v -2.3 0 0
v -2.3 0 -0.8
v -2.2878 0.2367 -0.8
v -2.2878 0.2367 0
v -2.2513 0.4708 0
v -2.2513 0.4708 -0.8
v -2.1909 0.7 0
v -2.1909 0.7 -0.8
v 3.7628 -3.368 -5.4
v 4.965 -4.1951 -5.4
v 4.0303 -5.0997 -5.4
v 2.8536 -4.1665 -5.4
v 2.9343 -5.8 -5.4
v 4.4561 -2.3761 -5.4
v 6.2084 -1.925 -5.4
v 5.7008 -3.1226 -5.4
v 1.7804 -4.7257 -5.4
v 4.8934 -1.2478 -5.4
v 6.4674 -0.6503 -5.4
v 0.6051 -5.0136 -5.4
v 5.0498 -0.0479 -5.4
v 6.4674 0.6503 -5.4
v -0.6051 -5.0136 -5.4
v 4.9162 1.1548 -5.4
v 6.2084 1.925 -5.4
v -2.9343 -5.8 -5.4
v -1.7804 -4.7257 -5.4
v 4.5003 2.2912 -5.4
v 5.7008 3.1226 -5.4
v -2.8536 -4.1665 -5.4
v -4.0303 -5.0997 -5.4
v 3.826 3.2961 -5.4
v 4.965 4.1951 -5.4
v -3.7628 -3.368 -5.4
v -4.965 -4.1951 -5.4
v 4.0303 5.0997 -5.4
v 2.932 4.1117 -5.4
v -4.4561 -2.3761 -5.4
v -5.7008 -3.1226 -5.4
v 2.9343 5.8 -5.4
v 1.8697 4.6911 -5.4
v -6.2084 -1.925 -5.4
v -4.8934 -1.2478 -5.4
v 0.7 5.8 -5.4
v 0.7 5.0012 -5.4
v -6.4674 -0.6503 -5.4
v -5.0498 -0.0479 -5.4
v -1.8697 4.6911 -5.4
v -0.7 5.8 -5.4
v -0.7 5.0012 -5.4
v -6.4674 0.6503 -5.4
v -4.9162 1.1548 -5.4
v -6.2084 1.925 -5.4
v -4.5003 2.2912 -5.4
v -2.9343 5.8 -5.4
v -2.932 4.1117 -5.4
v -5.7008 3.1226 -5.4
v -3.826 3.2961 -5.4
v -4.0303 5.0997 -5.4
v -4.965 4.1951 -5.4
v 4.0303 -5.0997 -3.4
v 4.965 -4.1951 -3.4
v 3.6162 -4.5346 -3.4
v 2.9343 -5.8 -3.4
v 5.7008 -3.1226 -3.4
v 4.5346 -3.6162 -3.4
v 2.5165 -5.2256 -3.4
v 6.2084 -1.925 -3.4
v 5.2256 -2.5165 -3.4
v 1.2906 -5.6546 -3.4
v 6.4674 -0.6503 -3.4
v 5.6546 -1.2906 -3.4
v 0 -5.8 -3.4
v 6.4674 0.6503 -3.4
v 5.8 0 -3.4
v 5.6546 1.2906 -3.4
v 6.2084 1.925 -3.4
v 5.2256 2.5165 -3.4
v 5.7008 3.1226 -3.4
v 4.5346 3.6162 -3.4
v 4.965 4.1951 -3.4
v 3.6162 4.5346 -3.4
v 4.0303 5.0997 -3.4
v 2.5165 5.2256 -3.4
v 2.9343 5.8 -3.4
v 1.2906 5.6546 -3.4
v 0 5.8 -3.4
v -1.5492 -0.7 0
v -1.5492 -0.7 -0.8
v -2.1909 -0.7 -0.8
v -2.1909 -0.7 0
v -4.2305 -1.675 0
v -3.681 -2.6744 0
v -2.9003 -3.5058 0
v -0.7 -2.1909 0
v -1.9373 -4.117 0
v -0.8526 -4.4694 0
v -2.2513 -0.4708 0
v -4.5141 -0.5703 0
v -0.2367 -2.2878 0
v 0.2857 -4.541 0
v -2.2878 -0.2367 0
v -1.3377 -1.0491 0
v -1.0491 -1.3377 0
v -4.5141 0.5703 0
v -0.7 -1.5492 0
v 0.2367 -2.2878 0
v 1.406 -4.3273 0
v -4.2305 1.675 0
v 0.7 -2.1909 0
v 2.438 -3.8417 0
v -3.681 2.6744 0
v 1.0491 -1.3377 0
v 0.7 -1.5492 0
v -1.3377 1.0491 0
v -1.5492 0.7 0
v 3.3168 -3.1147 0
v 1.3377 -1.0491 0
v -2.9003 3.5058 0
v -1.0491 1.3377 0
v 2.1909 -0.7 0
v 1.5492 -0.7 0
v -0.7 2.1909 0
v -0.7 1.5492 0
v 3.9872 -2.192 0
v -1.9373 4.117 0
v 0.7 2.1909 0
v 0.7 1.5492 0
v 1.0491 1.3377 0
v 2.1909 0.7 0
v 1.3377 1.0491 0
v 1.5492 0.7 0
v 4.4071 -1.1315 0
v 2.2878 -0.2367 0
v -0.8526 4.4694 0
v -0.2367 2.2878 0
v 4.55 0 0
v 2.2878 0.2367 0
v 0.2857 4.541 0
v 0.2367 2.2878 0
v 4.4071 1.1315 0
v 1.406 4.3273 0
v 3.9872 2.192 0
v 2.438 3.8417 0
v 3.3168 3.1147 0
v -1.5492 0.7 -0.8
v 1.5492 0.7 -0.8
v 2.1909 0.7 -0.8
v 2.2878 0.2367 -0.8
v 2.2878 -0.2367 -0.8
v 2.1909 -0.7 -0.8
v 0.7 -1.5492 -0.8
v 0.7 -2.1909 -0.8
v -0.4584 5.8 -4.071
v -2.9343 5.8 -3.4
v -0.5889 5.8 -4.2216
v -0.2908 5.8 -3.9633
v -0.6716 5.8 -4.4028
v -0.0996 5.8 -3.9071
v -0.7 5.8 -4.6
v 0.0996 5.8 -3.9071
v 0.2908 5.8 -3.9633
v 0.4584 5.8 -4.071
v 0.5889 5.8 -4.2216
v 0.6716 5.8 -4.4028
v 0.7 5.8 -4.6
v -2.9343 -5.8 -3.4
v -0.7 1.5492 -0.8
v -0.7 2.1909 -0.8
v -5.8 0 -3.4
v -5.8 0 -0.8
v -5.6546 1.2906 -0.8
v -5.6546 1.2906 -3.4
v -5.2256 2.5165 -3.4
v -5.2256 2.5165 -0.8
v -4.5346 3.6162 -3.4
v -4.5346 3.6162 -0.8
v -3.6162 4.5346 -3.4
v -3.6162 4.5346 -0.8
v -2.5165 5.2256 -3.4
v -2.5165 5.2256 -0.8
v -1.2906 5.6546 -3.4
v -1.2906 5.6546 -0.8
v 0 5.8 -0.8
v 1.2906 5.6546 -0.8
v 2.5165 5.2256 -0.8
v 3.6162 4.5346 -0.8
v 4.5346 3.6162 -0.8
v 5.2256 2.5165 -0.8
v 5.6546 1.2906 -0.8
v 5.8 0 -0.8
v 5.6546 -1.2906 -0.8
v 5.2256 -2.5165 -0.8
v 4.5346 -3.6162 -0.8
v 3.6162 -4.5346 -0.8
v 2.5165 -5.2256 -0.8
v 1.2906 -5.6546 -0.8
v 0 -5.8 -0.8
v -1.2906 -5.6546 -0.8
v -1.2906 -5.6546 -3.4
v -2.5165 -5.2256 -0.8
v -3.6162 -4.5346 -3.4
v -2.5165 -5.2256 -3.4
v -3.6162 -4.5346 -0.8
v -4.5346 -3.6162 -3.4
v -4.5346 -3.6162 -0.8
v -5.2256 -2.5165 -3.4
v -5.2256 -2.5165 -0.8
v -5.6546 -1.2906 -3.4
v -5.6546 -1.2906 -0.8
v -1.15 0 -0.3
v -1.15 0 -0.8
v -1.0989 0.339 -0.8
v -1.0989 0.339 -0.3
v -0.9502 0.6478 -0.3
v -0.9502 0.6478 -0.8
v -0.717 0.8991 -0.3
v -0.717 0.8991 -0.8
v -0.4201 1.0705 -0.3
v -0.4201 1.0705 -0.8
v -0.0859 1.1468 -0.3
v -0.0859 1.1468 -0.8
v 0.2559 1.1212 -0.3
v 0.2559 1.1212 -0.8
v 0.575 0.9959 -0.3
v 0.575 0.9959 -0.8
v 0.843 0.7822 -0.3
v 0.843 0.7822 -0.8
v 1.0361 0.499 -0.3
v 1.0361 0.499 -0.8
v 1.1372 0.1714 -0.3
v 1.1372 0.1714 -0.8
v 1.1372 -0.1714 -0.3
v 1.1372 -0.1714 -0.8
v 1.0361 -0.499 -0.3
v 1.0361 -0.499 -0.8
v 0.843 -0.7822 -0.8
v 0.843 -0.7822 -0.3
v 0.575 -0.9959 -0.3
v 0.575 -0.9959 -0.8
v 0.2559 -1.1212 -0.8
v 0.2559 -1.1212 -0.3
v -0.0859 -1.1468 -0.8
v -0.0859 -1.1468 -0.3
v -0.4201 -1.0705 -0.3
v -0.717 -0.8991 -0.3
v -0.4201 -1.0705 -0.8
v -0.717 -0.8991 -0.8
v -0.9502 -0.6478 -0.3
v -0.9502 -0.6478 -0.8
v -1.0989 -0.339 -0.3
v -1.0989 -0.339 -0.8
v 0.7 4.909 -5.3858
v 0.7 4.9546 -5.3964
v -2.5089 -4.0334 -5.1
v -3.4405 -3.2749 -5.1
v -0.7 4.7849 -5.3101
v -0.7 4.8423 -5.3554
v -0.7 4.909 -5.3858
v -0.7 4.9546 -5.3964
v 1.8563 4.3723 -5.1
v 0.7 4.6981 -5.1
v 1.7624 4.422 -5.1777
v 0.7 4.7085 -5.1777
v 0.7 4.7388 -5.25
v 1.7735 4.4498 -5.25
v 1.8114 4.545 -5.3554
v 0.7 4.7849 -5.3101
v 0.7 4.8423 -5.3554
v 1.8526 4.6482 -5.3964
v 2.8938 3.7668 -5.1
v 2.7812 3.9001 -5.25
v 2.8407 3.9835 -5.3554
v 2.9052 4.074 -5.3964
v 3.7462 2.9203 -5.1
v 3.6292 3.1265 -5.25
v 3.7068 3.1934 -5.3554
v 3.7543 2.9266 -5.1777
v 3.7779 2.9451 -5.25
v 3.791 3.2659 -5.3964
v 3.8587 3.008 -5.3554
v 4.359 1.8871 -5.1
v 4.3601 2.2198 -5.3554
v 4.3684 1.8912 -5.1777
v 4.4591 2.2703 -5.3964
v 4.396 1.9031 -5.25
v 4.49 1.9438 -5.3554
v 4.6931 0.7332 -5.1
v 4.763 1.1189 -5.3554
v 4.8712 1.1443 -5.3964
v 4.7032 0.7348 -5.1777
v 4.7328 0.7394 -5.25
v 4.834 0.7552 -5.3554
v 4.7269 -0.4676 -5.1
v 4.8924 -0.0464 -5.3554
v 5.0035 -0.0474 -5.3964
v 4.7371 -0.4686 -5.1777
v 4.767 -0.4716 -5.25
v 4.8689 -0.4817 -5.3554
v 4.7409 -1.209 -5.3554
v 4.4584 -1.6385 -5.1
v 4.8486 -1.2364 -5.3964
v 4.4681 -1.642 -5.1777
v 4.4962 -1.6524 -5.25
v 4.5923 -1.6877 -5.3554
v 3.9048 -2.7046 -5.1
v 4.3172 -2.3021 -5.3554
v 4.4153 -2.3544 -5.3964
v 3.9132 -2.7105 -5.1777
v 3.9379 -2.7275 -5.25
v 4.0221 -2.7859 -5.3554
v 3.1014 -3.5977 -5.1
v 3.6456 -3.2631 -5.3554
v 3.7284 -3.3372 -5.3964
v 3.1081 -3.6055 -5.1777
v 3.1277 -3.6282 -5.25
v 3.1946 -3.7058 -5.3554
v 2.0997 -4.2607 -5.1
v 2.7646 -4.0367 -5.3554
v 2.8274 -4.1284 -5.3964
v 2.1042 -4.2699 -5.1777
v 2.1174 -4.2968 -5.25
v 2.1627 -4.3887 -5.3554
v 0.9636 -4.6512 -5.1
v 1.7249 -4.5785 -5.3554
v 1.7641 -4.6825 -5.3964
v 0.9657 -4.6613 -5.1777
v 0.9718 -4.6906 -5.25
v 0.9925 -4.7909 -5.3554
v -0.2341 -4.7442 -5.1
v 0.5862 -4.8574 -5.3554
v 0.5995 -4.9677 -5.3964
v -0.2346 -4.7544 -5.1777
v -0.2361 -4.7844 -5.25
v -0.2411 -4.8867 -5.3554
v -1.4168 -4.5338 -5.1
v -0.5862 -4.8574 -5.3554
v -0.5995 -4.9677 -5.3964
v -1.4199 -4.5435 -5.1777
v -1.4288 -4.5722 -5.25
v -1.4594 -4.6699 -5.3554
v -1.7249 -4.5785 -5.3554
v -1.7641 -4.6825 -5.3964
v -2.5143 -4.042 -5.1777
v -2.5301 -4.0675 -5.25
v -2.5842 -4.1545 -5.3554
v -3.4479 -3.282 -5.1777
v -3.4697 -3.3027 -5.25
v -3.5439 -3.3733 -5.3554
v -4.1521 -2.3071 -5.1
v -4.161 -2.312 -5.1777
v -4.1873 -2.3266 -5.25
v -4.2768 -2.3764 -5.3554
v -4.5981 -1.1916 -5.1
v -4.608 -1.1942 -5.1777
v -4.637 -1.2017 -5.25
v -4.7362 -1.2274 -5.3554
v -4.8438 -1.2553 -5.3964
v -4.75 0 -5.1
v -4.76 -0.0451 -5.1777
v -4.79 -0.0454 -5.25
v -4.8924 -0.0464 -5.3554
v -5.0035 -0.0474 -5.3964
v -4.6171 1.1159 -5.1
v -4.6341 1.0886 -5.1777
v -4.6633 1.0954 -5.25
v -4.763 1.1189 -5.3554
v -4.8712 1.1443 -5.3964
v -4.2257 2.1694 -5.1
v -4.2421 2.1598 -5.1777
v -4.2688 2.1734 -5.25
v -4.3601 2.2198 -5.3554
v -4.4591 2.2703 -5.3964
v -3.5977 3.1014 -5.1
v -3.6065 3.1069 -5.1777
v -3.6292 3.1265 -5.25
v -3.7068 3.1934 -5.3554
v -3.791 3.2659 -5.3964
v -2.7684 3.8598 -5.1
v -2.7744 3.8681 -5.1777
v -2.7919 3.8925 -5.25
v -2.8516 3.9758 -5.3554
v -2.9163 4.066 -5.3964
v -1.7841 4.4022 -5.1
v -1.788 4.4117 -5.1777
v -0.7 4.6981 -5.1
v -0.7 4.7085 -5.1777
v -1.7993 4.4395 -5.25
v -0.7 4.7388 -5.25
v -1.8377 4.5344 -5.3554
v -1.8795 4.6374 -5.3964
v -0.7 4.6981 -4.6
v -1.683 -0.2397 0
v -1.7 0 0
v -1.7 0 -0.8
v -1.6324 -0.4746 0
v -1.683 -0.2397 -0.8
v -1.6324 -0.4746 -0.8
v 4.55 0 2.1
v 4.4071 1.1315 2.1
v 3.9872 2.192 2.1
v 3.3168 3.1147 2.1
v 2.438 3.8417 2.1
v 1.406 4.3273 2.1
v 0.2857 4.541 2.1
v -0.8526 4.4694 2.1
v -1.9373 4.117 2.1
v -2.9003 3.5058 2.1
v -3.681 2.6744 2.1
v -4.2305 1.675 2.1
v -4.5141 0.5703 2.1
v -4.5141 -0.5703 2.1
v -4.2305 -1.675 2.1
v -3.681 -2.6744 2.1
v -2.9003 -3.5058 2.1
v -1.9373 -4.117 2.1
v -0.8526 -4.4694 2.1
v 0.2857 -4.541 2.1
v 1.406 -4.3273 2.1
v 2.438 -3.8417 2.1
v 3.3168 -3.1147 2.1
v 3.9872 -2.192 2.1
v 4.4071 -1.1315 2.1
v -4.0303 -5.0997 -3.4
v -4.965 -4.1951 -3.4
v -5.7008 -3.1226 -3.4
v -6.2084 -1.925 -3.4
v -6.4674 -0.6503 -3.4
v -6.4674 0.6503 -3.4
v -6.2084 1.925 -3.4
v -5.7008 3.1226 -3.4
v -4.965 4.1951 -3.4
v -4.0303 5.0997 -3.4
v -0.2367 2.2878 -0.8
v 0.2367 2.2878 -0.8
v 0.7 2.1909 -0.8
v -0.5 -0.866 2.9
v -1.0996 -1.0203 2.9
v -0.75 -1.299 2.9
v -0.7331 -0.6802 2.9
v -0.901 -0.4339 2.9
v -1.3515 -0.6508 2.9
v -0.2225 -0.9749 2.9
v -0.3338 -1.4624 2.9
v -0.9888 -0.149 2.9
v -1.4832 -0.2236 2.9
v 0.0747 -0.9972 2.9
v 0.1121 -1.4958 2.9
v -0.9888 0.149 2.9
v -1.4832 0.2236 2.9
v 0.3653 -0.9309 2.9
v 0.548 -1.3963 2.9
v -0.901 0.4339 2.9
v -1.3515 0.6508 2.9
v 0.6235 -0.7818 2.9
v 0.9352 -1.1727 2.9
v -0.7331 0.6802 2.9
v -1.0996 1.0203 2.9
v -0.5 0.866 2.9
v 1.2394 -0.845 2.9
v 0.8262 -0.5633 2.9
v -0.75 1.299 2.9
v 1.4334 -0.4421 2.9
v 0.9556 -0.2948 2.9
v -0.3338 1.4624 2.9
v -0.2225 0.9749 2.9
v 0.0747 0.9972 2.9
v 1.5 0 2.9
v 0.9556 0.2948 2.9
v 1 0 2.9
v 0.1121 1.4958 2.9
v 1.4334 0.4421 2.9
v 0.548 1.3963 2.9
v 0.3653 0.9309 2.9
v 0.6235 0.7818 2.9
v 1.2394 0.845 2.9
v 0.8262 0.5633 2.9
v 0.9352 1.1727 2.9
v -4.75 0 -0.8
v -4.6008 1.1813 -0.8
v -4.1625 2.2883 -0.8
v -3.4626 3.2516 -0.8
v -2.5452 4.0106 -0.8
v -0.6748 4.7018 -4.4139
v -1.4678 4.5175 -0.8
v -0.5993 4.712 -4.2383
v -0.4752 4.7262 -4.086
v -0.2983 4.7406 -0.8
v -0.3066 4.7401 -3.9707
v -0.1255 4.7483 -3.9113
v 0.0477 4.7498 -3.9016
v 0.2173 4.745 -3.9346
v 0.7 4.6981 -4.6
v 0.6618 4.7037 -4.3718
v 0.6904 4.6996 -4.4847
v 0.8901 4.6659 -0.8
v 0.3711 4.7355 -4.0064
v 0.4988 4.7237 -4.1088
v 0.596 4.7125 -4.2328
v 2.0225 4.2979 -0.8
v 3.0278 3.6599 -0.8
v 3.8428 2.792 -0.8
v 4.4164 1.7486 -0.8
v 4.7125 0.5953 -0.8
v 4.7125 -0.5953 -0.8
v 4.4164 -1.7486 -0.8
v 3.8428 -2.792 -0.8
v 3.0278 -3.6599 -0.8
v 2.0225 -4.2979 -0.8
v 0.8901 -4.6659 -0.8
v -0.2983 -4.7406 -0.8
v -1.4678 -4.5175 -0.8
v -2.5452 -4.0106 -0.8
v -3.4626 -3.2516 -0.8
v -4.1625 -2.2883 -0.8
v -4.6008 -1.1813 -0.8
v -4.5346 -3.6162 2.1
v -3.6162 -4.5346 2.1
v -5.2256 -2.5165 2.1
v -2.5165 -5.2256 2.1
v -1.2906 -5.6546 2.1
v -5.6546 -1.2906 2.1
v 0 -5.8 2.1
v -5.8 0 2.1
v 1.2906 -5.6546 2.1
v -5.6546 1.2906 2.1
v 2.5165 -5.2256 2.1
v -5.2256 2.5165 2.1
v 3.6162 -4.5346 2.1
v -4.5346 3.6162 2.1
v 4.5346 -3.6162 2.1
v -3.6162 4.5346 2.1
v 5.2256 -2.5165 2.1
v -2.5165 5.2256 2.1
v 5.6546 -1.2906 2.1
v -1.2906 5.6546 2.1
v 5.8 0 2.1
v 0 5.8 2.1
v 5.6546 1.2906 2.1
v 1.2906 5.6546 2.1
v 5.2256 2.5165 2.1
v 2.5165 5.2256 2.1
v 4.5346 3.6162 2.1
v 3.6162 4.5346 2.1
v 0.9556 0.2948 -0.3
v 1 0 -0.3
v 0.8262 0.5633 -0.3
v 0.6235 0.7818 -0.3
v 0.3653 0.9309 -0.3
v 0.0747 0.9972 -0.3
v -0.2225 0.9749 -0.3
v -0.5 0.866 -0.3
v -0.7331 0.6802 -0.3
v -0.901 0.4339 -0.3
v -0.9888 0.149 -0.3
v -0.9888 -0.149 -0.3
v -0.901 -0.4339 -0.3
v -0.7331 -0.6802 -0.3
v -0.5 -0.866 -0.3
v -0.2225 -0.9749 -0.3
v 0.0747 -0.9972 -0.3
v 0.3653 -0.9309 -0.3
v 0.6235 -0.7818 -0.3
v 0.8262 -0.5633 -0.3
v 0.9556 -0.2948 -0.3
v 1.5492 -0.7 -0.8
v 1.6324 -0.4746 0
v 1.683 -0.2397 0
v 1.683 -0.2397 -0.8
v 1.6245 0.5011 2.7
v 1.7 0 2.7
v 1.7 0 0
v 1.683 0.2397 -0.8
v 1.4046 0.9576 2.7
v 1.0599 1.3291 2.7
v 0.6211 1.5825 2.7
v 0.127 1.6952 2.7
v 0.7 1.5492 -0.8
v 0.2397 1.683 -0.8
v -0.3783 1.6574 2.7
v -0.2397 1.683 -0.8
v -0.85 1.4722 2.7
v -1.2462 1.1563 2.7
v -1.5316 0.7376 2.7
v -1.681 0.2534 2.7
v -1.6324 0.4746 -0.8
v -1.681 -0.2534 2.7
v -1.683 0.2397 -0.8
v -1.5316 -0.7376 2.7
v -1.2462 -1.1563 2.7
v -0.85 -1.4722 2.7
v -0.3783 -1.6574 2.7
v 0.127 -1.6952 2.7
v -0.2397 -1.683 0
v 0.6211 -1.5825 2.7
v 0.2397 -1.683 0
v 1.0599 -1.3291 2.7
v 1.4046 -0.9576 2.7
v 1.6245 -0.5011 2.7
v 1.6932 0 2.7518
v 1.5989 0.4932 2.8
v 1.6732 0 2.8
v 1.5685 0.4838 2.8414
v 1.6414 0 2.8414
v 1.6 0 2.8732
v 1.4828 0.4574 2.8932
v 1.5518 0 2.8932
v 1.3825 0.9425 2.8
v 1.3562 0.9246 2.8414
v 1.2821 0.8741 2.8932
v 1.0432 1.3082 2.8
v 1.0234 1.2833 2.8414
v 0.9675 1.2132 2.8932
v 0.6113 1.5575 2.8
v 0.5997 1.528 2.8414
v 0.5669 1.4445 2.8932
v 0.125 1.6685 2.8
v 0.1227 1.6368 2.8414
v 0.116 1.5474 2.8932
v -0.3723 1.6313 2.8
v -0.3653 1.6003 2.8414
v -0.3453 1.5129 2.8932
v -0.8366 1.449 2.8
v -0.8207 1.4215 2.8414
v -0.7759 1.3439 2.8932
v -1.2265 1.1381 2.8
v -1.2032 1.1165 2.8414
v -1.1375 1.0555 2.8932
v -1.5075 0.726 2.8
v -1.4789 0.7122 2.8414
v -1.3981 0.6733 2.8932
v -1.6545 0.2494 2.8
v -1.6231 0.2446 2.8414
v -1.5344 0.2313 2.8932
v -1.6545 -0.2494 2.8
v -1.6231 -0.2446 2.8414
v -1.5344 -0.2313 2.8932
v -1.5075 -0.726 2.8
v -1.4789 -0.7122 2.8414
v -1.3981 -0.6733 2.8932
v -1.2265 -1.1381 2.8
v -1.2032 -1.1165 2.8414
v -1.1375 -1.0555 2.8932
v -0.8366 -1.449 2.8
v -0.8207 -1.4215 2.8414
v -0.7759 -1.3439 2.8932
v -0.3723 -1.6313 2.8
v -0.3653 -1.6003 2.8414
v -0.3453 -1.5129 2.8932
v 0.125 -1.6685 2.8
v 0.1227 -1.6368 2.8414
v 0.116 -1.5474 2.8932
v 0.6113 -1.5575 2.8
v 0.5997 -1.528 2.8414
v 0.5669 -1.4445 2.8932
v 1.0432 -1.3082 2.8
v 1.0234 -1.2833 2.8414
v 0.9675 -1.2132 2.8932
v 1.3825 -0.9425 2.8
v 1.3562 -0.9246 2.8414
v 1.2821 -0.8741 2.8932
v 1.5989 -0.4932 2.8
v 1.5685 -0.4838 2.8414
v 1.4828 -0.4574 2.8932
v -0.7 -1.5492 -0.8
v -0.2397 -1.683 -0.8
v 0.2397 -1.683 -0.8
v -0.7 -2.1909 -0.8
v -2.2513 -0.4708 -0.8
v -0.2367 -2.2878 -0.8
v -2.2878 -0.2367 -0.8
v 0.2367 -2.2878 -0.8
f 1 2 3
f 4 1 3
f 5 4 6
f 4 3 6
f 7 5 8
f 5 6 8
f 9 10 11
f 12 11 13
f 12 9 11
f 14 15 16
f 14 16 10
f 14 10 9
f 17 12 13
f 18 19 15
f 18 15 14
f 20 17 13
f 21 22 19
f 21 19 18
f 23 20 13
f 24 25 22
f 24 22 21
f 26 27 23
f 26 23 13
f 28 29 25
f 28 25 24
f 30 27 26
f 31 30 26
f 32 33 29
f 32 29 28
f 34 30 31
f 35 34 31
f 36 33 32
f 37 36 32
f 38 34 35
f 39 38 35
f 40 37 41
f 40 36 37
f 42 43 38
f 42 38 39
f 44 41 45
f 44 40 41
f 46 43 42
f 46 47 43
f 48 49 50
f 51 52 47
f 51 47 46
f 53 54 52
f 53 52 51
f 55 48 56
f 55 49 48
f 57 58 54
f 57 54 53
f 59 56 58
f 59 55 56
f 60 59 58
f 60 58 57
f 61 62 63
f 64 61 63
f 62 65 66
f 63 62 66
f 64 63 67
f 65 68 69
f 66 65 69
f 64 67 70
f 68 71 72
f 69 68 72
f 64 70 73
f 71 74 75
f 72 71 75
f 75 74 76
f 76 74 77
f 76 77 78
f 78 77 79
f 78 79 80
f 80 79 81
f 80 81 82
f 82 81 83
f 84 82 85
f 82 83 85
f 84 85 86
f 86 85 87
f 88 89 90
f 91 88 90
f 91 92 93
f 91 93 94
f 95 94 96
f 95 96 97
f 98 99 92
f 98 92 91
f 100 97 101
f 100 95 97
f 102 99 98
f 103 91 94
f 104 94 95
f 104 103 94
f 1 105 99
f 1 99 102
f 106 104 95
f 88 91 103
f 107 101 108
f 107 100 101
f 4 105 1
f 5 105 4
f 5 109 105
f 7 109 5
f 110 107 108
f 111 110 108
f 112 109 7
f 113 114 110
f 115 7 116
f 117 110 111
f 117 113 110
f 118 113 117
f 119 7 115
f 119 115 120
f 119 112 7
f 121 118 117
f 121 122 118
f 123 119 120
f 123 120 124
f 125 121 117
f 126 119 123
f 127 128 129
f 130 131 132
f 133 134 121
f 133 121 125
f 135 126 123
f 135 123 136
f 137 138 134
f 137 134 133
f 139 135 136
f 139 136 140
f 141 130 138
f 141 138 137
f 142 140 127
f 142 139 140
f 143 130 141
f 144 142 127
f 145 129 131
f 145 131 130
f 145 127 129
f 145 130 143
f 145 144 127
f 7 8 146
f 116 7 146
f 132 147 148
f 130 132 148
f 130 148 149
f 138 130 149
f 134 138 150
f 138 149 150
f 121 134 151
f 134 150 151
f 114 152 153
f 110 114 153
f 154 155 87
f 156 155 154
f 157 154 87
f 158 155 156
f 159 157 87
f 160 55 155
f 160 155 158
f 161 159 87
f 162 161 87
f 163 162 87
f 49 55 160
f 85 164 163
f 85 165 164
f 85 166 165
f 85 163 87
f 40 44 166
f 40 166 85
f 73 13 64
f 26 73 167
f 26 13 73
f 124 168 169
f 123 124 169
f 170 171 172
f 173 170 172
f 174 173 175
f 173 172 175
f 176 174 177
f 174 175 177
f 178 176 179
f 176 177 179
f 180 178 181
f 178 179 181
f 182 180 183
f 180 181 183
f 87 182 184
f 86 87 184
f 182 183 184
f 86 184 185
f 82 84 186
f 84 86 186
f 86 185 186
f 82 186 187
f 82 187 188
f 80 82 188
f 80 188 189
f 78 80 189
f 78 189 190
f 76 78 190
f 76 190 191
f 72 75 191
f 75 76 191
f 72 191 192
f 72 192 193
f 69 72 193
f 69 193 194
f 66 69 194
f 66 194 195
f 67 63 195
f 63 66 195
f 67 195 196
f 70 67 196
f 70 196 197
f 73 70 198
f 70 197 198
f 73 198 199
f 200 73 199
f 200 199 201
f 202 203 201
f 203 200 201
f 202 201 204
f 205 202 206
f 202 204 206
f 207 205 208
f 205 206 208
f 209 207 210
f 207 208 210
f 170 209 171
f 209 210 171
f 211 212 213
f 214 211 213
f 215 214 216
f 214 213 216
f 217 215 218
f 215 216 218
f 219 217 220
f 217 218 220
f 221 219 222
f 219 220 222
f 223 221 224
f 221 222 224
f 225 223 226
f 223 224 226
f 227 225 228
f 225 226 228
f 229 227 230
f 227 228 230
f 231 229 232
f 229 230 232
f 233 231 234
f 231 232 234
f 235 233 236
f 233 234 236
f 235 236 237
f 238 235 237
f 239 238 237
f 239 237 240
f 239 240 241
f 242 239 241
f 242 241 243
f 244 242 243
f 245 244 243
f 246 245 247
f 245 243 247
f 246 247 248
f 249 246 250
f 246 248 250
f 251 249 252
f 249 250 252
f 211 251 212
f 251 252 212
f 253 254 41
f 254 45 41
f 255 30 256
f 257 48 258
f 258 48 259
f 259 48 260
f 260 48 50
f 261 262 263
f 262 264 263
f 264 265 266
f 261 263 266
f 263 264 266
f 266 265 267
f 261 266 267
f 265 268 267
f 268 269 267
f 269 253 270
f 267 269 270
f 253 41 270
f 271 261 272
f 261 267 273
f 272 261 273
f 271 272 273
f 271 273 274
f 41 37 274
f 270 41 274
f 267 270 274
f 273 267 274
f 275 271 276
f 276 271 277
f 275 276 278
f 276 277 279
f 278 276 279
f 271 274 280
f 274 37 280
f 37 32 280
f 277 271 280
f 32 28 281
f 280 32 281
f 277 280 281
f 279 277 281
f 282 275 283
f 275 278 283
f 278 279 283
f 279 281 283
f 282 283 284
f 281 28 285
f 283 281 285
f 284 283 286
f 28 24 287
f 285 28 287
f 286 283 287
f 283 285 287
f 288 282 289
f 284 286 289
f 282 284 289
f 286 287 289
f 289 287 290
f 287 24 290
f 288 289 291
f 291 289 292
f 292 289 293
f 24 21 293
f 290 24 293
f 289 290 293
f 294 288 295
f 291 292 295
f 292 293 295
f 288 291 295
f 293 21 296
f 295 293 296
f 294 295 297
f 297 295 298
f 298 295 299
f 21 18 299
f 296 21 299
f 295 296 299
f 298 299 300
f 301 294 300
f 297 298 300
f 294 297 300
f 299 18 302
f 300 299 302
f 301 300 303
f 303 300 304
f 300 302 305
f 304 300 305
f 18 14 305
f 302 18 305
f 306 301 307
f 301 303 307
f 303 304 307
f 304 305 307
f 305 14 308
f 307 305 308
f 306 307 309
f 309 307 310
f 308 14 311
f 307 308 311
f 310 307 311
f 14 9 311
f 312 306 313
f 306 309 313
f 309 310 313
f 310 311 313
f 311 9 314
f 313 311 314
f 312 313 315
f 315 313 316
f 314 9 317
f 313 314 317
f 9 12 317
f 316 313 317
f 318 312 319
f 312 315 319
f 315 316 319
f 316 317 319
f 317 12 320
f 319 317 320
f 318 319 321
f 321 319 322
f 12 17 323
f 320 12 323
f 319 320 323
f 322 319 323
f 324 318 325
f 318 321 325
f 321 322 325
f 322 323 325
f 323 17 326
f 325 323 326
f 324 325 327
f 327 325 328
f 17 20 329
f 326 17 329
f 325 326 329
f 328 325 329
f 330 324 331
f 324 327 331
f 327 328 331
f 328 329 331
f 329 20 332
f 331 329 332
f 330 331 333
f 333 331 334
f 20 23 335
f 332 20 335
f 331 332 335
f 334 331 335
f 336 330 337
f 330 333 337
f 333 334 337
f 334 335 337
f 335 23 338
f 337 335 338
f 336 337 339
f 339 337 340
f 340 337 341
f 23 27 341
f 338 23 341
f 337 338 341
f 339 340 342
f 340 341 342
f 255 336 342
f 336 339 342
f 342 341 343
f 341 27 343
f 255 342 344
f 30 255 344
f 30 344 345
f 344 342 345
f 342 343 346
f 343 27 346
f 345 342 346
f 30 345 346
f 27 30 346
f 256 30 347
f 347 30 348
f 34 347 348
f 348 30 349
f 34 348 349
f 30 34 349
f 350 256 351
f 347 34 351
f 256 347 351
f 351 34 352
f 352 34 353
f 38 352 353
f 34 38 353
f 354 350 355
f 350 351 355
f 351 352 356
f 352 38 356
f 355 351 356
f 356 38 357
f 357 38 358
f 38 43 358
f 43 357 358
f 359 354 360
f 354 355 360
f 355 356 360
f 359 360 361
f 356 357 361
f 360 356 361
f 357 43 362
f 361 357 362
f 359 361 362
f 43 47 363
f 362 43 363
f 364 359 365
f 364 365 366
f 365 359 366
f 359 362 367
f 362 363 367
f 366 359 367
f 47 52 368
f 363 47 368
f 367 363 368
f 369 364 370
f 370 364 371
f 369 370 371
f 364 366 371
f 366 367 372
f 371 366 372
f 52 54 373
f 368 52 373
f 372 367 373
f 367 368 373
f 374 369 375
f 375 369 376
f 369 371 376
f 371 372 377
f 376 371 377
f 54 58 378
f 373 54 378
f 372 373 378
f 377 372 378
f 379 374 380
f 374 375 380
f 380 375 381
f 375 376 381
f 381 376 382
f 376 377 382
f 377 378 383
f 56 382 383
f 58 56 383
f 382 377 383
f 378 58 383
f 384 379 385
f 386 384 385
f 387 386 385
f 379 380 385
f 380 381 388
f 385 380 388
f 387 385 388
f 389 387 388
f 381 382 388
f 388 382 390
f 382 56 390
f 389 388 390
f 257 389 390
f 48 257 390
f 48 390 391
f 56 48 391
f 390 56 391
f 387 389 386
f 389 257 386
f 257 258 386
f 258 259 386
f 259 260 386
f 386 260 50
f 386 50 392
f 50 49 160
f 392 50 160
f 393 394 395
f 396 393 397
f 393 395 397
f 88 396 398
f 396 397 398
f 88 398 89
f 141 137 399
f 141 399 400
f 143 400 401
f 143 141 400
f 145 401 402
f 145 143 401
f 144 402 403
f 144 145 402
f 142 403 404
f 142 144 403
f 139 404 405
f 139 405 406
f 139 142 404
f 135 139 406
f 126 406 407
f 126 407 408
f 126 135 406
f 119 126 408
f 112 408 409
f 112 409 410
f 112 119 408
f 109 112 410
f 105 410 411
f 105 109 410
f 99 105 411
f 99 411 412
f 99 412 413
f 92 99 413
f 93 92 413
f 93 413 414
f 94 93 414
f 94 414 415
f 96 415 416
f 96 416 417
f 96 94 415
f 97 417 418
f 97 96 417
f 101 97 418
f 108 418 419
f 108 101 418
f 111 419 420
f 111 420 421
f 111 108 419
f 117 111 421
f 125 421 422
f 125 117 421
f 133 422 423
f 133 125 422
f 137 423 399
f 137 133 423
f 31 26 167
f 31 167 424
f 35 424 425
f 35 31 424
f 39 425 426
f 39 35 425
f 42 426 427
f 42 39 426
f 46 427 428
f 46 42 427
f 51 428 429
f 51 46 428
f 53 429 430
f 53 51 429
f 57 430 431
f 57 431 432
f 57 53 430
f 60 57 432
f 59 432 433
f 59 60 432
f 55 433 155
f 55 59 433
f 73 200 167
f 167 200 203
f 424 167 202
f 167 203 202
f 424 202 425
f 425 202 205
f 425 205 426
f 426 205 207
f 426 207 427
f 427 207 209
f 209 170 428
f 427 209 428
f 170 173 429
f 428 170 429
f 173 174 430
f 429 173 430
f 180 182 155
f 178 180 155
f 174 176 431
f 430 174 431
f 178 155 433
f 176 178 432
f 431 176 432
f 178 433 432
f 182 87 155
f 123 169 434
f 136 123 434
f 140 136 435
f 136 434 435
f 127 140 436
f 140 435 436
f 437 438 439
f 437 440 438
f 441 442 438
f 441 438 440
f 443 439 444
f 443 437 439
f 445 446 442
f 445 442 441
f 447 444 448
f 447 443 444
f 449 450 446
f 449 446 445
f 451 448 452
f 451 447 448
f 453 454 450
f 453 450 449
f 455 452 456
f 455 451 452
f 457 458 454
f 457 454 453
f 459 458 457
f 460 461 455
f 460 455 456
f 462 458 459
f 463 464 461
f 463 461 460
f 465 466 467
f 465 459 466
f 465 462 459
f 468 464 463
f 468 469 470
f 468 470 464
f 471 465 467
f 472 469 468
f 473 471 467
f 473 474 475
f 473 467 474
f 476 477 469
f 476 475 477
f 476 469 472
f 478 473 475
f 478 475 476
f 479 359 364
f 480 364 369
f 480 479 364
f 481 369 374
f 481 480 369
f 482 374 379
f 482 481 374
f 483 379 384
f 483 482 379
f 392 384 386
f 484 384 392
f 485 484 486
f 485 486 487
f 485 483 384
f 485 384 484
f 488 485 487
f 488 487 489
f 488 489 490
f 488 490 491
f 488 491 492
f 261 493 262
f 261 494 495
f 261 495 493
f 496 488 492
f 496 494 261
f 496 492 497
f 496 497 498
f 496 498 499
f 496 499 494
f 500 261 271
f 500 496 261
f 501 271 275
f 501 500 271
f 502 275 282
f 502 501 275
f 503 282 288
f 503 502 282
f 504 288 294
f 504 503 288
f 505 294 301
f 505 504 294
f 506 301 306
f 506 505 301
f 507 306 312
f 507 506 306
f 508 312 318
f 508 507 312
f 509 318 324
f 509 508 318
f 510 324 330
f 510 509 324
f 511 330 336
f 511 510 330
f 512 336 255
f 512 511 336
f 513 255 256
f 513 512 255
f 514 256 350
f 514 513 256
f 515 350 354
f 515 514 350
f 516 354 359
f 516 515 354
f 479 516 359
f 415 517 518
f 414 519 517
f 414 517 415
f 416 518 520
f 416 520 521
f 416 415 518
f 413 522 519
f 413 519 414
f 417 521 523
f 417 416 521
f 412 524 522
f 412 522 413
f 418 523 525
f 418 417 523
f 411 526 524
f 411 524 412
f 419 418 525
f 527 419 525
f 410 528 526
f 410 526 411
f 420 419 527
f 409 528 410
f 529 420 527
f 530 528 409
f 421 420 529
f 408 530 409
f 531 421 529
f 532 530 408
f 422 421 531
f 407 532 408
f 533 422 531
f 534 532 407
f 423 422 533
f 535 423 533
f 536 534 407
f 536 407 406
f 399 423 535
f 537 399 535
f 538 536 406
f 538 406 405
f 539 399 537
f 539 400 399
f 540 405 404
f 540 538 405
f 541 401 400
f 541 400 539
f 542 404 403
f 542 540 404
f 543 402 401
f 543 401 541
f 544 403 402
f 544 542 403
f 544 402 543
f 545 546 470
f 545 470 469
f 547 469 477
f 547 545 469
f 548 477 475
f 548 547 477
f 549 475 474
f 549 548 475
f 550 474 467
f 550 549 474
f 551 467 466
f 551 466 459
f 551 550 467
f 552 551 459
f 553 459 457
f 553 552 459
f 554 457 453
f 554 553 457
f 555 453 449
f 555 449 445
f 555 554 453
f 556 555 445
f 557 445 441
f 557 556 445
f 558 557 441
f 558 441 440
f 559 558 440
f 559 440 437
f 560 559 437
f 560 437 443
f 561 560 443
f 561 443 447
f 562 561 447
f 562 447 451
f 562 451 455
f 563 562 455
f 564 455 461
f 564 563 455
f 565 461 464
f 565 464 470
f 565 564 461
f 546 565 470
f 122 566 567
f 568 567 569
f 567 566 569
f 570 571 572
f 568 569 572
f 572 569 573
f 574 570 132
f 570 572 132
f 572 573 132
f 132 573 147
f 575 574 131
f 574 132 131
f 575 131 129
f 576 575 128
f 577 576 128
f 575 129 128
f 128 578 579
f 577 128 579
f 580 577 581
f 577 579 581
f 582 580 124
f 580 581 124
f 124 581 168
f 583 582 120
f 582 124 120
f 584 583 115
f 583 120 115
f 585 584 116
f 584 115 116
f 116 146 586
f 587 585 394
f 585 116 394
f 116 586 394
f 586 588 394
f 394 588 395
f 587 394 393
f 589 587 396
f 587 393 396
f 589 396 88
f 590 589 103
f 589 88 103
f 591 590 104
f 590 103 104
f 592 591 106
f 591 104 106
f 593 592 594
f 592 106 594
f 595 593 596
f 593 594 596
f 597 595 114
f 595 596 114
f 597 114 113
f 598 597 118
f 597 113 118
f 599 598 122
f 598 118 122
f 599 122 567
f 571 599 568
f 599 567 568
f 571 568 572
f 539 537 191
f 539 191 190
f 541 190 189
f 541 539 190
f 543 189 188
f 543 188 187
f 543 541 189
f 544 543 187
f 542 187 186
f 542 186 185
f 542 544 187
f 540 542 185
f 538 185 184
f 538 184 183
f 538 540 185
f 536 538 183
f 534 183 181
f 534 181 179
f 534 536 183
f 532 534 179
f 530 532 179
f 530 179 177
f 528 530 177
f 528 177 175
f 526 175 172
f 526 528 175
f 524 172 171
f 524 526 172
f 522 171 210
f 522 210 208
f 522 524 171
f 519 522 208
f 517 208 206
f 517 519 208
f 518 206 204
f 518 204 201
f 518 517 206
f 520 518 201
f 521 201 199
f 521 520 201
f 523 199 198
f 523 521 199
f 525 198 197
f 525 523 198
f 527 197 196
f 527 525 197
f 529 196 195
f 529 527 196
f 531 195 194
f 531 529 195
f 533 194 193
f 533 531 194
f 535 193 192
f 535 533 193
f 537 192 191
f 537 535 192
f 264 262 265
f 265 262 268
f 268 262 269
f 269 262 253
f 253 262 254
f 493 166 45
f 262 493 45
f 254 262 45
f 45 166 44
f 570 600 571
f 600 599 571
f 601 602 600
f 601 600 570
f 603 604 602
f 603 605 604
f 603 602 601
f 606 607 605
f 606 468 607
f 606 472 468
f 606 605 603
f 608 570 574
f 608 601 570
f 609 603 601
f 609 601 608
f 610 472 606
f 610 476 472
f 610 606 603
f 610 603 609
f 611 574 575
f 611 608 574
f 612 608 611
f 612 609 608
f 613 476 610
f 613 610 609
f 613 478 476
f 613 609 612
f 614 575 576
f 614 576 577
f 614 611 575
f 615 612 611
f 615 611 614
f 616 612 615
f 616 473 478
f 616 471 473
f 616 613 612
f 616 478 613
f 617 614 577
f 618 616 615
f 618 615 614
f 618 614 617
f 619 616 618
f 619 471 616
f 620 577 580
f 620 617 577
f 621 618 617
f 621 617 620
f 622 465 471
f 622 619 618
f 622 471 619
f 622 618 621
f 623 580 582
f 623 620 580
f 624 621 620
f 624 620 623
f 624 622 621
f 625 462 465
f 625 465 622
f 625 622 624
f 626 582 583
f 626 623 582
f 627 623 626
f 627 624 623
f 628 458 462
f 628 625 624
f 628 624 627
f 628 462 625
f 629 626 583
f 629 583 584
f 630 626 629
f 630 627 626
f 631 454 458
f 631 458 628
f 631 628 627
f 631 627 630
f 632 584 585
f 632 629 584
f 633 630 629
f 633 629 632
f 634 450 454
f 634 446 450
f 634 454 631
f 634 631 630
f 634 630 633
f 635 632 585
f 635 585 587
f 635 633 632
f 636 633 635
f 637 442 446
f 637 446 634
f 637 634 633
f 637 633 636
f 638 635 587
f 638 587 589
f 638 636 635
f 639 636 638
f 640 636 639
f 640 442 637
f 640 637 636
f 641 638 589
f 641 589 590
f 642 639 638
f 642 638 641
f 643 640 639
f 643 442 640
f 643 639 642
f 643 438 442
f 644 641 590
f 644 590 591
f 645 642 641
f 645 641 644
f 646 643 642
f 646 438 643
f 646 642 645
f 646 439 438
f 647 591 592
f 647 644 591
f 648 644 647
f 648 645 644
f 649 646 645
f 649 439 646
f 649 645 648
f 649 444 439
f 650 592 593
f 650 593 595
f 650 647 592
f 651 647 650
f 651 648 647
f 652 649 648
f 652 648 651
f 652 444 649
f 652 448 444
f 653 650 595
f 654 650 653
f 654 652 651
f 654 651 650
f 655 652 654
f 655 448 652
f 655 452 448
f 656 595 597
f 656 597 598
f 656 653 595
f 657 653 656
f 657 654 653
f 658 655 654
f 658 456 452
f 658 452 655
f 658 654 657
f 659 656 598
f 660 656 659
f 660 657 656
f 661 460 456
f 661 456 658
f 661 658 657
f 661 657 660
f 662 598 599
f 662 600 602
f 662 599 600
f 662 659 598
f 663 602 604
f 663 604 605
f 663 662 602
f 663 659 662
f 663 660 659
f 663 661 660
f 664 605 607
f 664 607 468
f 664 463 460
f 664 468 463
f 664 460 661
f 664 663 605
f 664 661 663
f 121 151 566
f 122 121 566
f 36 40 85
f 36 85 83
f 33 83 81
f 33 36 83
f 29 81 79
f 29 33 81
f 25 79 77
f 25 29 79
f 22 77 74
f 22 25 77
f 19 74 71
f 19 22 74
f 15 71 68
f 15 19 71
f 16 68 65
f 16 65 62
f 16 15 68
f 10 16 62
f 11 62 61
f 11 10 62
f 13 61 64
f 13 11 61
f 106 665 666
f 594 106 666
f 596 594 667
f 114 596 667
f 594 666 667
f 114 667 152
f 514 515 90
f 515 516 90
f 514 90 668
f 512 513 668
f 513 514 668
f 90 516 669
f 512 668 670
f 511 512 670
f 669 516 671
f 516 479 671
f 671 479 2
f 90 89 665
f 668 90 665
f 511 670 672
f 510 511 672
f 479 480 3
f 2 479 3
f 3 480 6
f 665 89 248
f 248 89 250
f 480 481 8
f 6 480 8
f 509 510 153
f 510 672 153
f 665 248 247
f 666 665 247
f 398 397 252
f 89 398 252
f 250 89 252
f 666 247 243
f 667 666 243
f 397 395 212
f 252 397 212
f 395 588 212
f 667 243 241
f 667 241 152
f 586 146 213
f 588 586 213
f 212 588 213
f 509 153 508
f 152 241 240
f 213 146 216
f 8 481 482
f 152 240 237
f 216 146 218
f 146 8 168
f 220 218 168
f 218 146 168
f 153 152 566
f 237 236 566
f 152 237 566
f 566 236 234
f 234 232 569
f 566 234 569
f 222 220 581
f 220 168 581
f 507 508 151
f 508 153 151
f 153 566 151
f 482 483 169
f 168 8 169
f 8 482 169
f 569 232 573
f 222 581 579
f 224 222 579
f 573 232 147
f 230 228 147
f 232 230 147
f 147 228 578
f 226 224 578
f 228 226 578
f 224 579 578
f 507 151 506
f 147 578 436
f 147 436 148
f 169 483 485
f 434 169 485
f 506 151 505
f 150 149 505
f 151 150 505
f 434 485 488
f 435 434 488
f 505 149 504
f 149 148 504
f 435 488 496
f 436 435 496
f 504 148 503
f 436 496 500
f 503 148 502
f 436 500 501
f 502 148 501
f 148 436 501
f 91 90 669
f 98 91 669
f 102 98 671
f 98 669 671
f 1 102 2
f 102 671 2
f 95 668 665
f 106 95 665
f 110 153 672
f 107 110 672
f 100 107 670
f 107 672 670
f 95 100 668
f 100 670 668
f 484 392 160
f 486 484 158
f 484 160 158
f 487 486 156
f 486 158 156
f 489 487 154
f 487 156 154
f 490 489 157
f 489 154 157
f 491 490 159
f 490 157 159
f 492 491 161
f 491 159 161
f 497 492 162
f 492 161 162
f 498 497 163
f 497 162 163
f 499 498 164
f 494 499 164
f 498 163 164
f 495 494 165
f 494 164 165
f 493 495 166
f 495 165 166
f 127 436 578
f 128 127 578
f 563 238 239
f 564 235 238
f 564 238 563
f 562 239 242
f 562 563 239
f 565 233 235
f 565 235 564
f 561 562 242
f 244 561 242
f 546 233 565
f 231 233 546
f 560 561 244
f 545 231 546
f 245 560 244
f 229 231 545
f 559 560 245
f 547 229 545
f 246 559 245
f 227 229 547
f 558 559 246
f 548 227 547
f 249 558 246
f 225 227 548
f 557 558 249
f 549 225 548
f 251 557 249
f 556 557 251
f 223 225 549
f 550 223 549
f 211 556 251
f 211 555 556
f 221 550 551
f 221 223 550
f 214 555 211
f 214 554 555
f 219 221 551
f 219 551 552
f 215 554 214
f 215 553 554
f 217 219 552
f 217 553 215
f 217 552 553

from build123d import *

# Parameters (mm, degrees)
SKETCH_1_R               = 5.8
SKETCH_1_R_2             = 4.55
EXTRUDE_1_DEPTH          = 2.1
SKETCH_1_3_R             = 1.7
SKETCH_1_3_R_2           = 1
EXTRUDE_2_DEPTH          = 2.9
SKETCH_1_5_R             = 5.8
SKETCH_1_5_R_2           = 4.55
SKETCH_1_5_R_3           = 1.7
SKETCH_1_5_R_4           = 1
EXTRUDE_4_DEPTH          = 0.8
SKETCH_2_R               = 5.8
SKETCH_2_R_2             = 4.75
EXTRUDE_5_DEPTH          = 4.6
EXTRUDE_6_DEPTH          = 2
CUT_EXTRUDE_1_REACH      = 11.851
FILLET_1_R               = 0.2
FILLET_2_R               = 0.3
SKETCH_6_R               = 1.15
CUT_EXTRUDE_4_DEPTH      = 0.5
CUT_EXTRUDE_5_REACH      = 16.352
CUT_EXTRUDE_5_END_RADIUS = 4.75


with BuildPart() as part:
    # Sketch 1 → Extrude 1 (new body)
    with BuildSketch(Plane.XY):
        Circle(SKETCH_1_R)
        Circle(SKETCH_1_R_2, mode=Mode.SUBTRACT)
    extrude(amount=EXTRUDE_1_DEPTH)



with BuildPart() as body_2:
    # Sketch 1_3 → Extrude 2 (new body)
    with BuildSketch(Plane.XY):
        Circle(SKETCH_1_3_R)
        Circle(SKETCH_1_3_R_2, mode=Mode.SUBTRACT)
    extrude(amount=EXTRUDE_2_DEPTH)


with BuildPart() as part_1:
    add(part.part)

    add(body_2.part)  # Extrude 4 merges body 2
    # Sketch 1_5 → Extrude 4 (add)
    with BuildSketch(Plane.XY):
        Circle(SKETCH_1_5_R)
        Circle(SKETCH_1_5_R_2, mode=Mode.SUBTRACT)
        Circle(SKETCH_1_5_R_2)
        Circle(SKETCH_1_5_R_3, mode=Mode.SUBTRACT)
        Circle(SKETCH_1_5_R_3)
        Circle(SKETCH_1_5_R_4, mode=Mode.SUBTRACT)
    extrude(amount=-EXTRUDE_4_DEPTH)

    # Sketch 2 → Extrude 5 (add)
    with BuildSketch(Plane(origin=(0, 0, -0.8), x_dir=(-1, 0, 0), z_dir=(0, 0, -1))):
        Circle(SKETCH_2_R)
        Circle(SKETCH_2_R_2, mode=Mode.SUBTRACT)
    extrude(amount=EXTRUDE_5_DEPTH)

    # Sketch 3 → Extrude 6 (add)
    with BuildSketch(Plane(origin=(0, 0, -5.4), x_dir=(-1, 0, 0), z_dir=(0, 0, -1))):
        with BuildLine():
            Line((0, 5.8), (-2.93428015, 5.8))
            ThreePointArc((-2.93428015, 5.8), (-6.5, 0), (-2.93428015, -5.8))
            Line((-2.93428015, -5.8), (0, -5.8))
            ThreePointArc((0, -5.8), (-5.8, 0), (0, 5.8))
        make_face()
        with BuildLine():
            Line((2.93428015, 5.8), (0, 5.8))
            ThreePointArc((0, 5.8), (5.8, 0), (0, -5.8))
            Line((0, -5.8), (2.93428015, -5.8))
            ThreePointArc((2.93428015, -5.8), (6.5, 0), (2.93428015, 5.8))
        make_face()
    extrude(amount=-EXTRUDE_6_DEPTH)

    # Sketch 4 → Cut-Extrude 1 (cut, up to next)
    with BuildSketch(Plane(origin=(0, 0, -0.8), x_dir=(-1, 0, 0), z_dir=(0, 0, -1)), mode=Mode.PRIVATE) as cut_extrude_1_sk1:
        with BuildLine():
            Line((-0.7, -1.549193338), (-0.7, -2.19089023))
            ThreePointArc((-0.7, -2.19089023), (0, -2.3), (0.7, -2.19089023))
            Line((0.7, -2.19089023), (0.7, -1.549193338))
            ThreePointArc((0.7, -1.549193338), (0, -1.7), (-0.7, -1.549193338))
        make_face()
    cut_extrude_1_tool1 = extrude(cut_extrude_1_sk1.sketch, amount=-CUT_EXTRUDE_1_REACH, mode=Mode.PRIVATE) & part_1.part
    # Sketch 4 → Cut-Extrude 1 (cut, up to next)
    with BuildSketch(Plane(origin=(0, 0, -0.8), x_dir=(-1, 0, 0), z_dir=(0, 0, -1)), mode=Mode.PRIVATE) as cut_extrude_1_sk2:
        with BuildLine():
            ThreePointArc((0.7, 2.19089023), (0, 2.3), (-0.7, 2.19089023))
            Line((-0.7, 2.19089023), (-0.7, 1.549193338))
            ThreePointArc((-0.7, 1.549193338), (0, 1.7), (0.7, 1.549193338))
            Line((0.7, 1.549193338), (0.7, 2.19089023))
        make_face()
    cut_extrude_1_tool2 = extrude(cut_extrude_1_sk2.sketch, amount=-CUT_EXTRUDE_1_REACH, mode=Mode.PRIVATE) & part_1.part
    # Sketch 4 → Cut-Extrude 1 (cut, up to next)
    with BuildSketch(Plane(origin=(0, 0, -0.8), x_dir=(-1, 0, 0), z_dir=(0, 0, -1)), mode=Mode.PRIVATE) as cut_extrude_1_sk3:
        with BuildLine():
            ThreePointArc((-2.19089023, 0.7), (-2.3, 0), (-2.19089023, -0.7))
            Line((-2.19089023, -0.7), (-1.549193338, -0.7))
            ThreePointArc((-1.549193338, -0.7), (-1.7, 0), (-1.549193338, 0.7))
            Line((-1.549193338, 0.7), (-2.19089023, 0.7))
        make_face()
    cut_extrude_1_tool3 = extrude(cut_extrude_1_sk3.sketch, amount=-CUT_EXTRUDE_1_REACH, mode=Mode.PRIVATE) & part_1.part
    # Sketch 4 → Cut-Extrude 1 (cut, up to next)
    with BuildSketch(Plane(origin=(0, 0, -0.8), x_dir=(-1, 0, 0), z_dir=(0, 0, -1)), mode=Mode.PRIVATE) as cut_extrude_1_sk4:
        with BuildLine():
            Line((1.549193338, -0.7), (2.19089023, -0.7))
            ThreePointArc((2.19089023, -0.7), (2.272558858, -0.354226249), (2.3, 0))
            ThreePointArc((2.3, 0), (2.272558858, 0.354226249), (2.19089023, 0.7))
            Line((2.19089023, 0.7), (1.549193338, 0.7))
            ThreePointArc((1.549193338, 0.7), (1.661870734, 0.358030253), (1.7, 0))
            ThreePointArc((1.7, 0), (1.661870734, -0.358030253), (1.549193338, -0.7))
        make_face()
    cut_extrude_1_tool4 = extrude(cut_extrude_1_sk4.sketch, amount=-CUT_EXTRUDE_1_REACH, mode=Mode.PRIVATE) & part_1.part
    # Sketch 4 → Cut-Extrude 1 (cut, up to next)
    with BuildSketch(Plane(origin=(0, 0, -0.8), x_dir=(-1, 0, 0), z_dir=(0, 0, -1)), mode=Mode.PRIVATE) as cut_extrude_1_sk5:
        with BuildLine():
            Line((-0.7, -1.549193338), (-0.7, -2.19089023))
            ThreePointArc((-0.7, -2.19089023), (0, -2.3), (0.7, -2.19089023))
            Line((0.7, -2.19089023), (0.7, -1.549193338))
            ThreePointArc((0.7, -1.549193338), (0, -1.7), (-0.7, -1.549193338))
        make_face()
    cut_extrude_1_tool5 = extrude(cut_extrude_1_sk5.sketch, amount=-CUT_EXTRUDE_1_REACH, mode=Mode.PRIVATE) & part_1.part
    # Sketch 4 → Cut-Extrude 1 (cut, up to next)
    with BuildSketch(Plane(origin=(0, 0, -0.8), x_dir=(-1, 0, 0), z_dir=(0, 0, -1)), mode=Mode.PRIVATE) as cut_extrude_1_sk6:
        with BuildLine():
            ThreePointArc((0.7, 2.19089023), (0, 2.3), (-0.7, 2.19089023))
            Line((-0.7, 2.19089023), (-0.7, 1.549193338))
            ThreePointArc((-0.7, 1.549193338), (0, 1.7), (0.7, 1.549193338))
            Line((0.7, 1.549193338), (0.7, 2.19089023))
        make_face()
    cut_extrude_1_tool6 = extrude(cut_extrude_1_sk6.sketch, amount=-CUT_EXTRUDE_1_REACH, mode=Mode.PRIVATE) & part_1.part
    # Sketch 4 → Cut-Extrude 1 (cut, up to next)
    with BuildSketch(Plane(origin=(0, 0, -0.8), x_dir=(-1, 0, 0), z_dir=(0, 0, -1)), mode=Mode.PRIVATE) as cut_extrude_1_sk7:
        with BuildLine():
            ThreePointArc((-2.19089023, 0.7), (-2.3, 0), (-2.19089023, -0.7))
            Line((-2.19089023, -0.7), (-1.549193338, -0.7))
            ThreePointArc((-1.549193338, -0.7), (-1.7, 0), (-1.549193338, 0.7))
            Line((-1.549193338, 0.7), (-2.19089023, 0.7))
        make_face()
    cut_extrude_1_tool7 = extrude(cut_extrude_1_sk7.sketch, amount=-CUT_EXTRUDE_1_REACH, mode=Mode.PRIVATE) & part_1.part
    # Sketch 4 → Cut-Extrude 1 (cut, up to next)
    with BuildSketch(Plane(origin=(0, 0, -0.8), x_dir=(-1, 0, 0), z_dir=(0, 0, -1)), mode=Mode.PRIVATE) as cut_extrude_1_sk8:
        with BuildLine():
            Line((1.549193338, -0.7), (2.19089023, -0.7))
            ThreePointArc((2.19089023, -0.7), (2.272558858, -0.354226249), (2.3, 0))
            ThreePointArc((2.3, 0), (2.272558858, 0.354226249), (2.19089023, 0.7))
            Line((2.19089023, 0.7), (1.549193338, 0.7))
            ThreePointArc((1.549193338, 0.7), (1.661870734, 0.358030253), (1.7, 0))
            ThreePointArc((1.7, 0), (1.661870734, -0.358030253), (1.549193338, -0.7))
        make_face()
    cut_extrude_1_tool8 = extrude(cut_extrude_1_sk8.sketch, amount=-CUT_EXTRUDE_1_REACH, mode=Mode.PRIVATE) & part_1.part
    add(cut_extrude_1_tool1.solids().sort_by_distance((0, -1.956551, -0.8))[0], mode=Mode.SUBTRACT)
    add(cut_extrude_1_tool2.solids().sort_by_distance((0, 1.956551, -0.8))[0], mode=Mode.SUBTRACT)
    add(cut_extrude_1_tool3.solids().sort_by_distance((1.956551, 0, -0.8))[0], mode=Mode.SUBTRACT)
    add(cut_extrude_1_tool4.solids().sort_by_distance((-1.956551, 0, -0.8))[0], mode=Mode.SUBTRACT)
    add(cut_extrude_1_tool5.solids().sort_by_distance((0, -1.956551, -0.8))[0], mode=Mode.SUBTRACT)
    add(cut_extrude_1_tool6.solids().sort_by_distance((0, 1.956551, -0.8))[0], mode=Mode.SUBTRACT)
    add(cut_extrude_1_tool7.solids().sort_by_distance((1.956551, 0, -0.8))[0], mode=Mode.SUBTRACT)
    add(cut_extrude_1_tool8.solids().sort_by_distance((-1.956551, 0, -0.8))[0], mode=Mode.SUBTRACT)

    # Fillet 1
    fillet_1_edges = [part_1.edges().sort_by_distance(p)[0] for p in [
        (-1.7, 0, 2.9),
    ]]
    fillet(fillet_1_edges, radius=FILLET_1_R)

    # Fillet 2
    fillet_2_edges = [part_1.edges().sort_by_distance(p)[0] for p in [
        (4.75, 0, -5.4),
    ]]
    fillet(fillet_2_edges, radius=FILLET_2_R)

    # Sketch 6 → Cut-Extrude 4 (cut)
    with BuildSketch(Plane(origin=(0, 0, -0.8), x_dir=(-1, 0, 0), z_dir=(0, 0, -1))):
        Circle(SKETCH_6_R)
    extrude(amount=-CUT_EXTRUDE_4_DEPTH, mode=Mode.SUBTRACT)

    # Cut-Extrude 5: up to this cylinder (the profile starts outside it)
    cut_extrude_5_end = Plane(origin=(0, 0, -4.843393), z_dir=(0, 0, 1)) * Cylinder(CUT_EXTRUDE_5_END_RADIUS, 44.284964, mode=Mode.PRIVATE)
    # Sketch 7 → Cut-Extrude 5 (cut, up to the surface)
    with BuildSketch(Plane(origin=(0, 5.8, 0), x_dir=(1, 0, 0), z_dir=(0, 1, 0)), mode=Mode.PRIVATE) as cut_extrude_5_sk1:
        with BuildLine():
            Line((-0.7, 5.4), (-0.7, 4.6))
            ThreePointArc((-0.7, 4.6), (0, 5.3), (0.7, 4.6))
            Line((0.7, 4.6), (0.7, 5.4))
            Line((0.7, 5.4), (-0.7, 5.4))
        make_face()
    cut_extrude_5_tool1 = extrude(cut_extrude_5_sk1.sketch, amount=-CUT_EXTRUDE_5_REACH, mode=Mode.PRIVATE) - cut_extrude_5_end
    add(cut_extrude_5_tool1.solids().sort_by_distance((0, 5.8, -5.383875))[0], mode=Mode.SUBTRACT)
    # Sketch 7 → Cut-Extrude 5 (cut, up to the surface)
    with BuildSketch(Plane(origin=(0, 5.8, 0), x_dir=(1, 0, 0), z_dir=(0, 1, 0)), mode=Mode.PRIVATE) as cut_extrude_5_sk2:
        with BuildLine():
            ThreePointArc((0.7, 4.6), (0, 5.3), (-0.7, 4.6))
            Line((-0.7, 4.6), (0.7, 4.6))
        make_face()
    cut_extrude_5_tool2 = extrude(cut_extrude_5_sk2.sketch, amount=-CUT_EXTRUDE_5_REACH, mode=Mode.PRIVATE) - cut_extrude_5_end
    add(cut_extrude_5_tool2.solids().sort_by_distance((0, 5.8, -4.897089))[0], mode=Mode.SUBTRACT)
    # Sketch 7 → Cut-Extrude 5 (cut, up to the surface)
    with BuildSketch(Plane(origin=(0, 5.8, 0), x_dir=(1, 0, 0), z_dir=(0, 1, 0)), mode=Mode.PRIVATE) as cut_extrude_5_sk3:
        with BuildLine():
            Line((0.7, 4.6), (-0.7, 4.6))
            ThreePointArc((-0.7, 4.6), (0, 3.9), (0.7, 4.6))
        make_face()
    cut_extrude_5_tool3 = extrude(cut_extrude_5_sk3.sketch, amount=-CUT_EXTRUDE_5_REACH, mode=Mode.PRIVATE) - cut_extrude_5_end
    add(cut_extrude_5_tool3.solids().sort_by_distance((0, 5.8, -4.302911))[0], mode=Mode.SUBTRACT)
    # Sketch 7 → Cut-Extrude 5 (cut, up to the surface)
    with BuildSketch(Plane(origin=(0, 5.8, 0), x_dir=(1, 0, 0), z_dir=(0, 1, 0)), mode=Mode.PRIVATE) as cut_extrude_5_sk4:
        with BuildLine():
            ThreePointArc((0.7, 4.6), (0, 5.3), (-0.7, 4.6))
            Line((-0.7, 4.6), (0.7, 4.6))
        make_face()
    cut_extrude_5_tool4 = extrude(cut_extrude_5_sk4.sketch, amount=-CUT_EXTRUDE_5_REACH, mode=Mode.PRIVATE) - cut_extrude_5_end
    add(cut_extrude_5_tool4.solids().sort_by_distance((0, 5.8, -4.897089))[0], mode=Mode.SUBTRACT)
    # Sketch 7 → Cut-Extrude 5 (cut, up to the surface)
    with BuildSketch(Plane(origin=(0, 5.8, 0), x_dir=(1, 0, 0), z_dir=(0, 1, 0)), mode=Mode.PRIVATE) as cut_extrude_5_sk5:
        with BuildLine():
            Line((0.7, 4.6), (-0.7, 4.6))
            ThreePointArc((-0.7, 4.6), (0, 3.9), (0.7, 4.6))
        make_face()
    cut_extrude_5_tool5 = extrude(cut_extrude_5_sk5.sketch, amount=-CUT_EXTRUDE_5_REACH, mode=Mode.PRIVATE) - cut_extrude_5_end
    add(cut_extrude_5_tool5.solids().sort_by_distance((0, 5.8, -4.302911))[0], mode=Mode.SUBTRACT)


solid = part_1.part
